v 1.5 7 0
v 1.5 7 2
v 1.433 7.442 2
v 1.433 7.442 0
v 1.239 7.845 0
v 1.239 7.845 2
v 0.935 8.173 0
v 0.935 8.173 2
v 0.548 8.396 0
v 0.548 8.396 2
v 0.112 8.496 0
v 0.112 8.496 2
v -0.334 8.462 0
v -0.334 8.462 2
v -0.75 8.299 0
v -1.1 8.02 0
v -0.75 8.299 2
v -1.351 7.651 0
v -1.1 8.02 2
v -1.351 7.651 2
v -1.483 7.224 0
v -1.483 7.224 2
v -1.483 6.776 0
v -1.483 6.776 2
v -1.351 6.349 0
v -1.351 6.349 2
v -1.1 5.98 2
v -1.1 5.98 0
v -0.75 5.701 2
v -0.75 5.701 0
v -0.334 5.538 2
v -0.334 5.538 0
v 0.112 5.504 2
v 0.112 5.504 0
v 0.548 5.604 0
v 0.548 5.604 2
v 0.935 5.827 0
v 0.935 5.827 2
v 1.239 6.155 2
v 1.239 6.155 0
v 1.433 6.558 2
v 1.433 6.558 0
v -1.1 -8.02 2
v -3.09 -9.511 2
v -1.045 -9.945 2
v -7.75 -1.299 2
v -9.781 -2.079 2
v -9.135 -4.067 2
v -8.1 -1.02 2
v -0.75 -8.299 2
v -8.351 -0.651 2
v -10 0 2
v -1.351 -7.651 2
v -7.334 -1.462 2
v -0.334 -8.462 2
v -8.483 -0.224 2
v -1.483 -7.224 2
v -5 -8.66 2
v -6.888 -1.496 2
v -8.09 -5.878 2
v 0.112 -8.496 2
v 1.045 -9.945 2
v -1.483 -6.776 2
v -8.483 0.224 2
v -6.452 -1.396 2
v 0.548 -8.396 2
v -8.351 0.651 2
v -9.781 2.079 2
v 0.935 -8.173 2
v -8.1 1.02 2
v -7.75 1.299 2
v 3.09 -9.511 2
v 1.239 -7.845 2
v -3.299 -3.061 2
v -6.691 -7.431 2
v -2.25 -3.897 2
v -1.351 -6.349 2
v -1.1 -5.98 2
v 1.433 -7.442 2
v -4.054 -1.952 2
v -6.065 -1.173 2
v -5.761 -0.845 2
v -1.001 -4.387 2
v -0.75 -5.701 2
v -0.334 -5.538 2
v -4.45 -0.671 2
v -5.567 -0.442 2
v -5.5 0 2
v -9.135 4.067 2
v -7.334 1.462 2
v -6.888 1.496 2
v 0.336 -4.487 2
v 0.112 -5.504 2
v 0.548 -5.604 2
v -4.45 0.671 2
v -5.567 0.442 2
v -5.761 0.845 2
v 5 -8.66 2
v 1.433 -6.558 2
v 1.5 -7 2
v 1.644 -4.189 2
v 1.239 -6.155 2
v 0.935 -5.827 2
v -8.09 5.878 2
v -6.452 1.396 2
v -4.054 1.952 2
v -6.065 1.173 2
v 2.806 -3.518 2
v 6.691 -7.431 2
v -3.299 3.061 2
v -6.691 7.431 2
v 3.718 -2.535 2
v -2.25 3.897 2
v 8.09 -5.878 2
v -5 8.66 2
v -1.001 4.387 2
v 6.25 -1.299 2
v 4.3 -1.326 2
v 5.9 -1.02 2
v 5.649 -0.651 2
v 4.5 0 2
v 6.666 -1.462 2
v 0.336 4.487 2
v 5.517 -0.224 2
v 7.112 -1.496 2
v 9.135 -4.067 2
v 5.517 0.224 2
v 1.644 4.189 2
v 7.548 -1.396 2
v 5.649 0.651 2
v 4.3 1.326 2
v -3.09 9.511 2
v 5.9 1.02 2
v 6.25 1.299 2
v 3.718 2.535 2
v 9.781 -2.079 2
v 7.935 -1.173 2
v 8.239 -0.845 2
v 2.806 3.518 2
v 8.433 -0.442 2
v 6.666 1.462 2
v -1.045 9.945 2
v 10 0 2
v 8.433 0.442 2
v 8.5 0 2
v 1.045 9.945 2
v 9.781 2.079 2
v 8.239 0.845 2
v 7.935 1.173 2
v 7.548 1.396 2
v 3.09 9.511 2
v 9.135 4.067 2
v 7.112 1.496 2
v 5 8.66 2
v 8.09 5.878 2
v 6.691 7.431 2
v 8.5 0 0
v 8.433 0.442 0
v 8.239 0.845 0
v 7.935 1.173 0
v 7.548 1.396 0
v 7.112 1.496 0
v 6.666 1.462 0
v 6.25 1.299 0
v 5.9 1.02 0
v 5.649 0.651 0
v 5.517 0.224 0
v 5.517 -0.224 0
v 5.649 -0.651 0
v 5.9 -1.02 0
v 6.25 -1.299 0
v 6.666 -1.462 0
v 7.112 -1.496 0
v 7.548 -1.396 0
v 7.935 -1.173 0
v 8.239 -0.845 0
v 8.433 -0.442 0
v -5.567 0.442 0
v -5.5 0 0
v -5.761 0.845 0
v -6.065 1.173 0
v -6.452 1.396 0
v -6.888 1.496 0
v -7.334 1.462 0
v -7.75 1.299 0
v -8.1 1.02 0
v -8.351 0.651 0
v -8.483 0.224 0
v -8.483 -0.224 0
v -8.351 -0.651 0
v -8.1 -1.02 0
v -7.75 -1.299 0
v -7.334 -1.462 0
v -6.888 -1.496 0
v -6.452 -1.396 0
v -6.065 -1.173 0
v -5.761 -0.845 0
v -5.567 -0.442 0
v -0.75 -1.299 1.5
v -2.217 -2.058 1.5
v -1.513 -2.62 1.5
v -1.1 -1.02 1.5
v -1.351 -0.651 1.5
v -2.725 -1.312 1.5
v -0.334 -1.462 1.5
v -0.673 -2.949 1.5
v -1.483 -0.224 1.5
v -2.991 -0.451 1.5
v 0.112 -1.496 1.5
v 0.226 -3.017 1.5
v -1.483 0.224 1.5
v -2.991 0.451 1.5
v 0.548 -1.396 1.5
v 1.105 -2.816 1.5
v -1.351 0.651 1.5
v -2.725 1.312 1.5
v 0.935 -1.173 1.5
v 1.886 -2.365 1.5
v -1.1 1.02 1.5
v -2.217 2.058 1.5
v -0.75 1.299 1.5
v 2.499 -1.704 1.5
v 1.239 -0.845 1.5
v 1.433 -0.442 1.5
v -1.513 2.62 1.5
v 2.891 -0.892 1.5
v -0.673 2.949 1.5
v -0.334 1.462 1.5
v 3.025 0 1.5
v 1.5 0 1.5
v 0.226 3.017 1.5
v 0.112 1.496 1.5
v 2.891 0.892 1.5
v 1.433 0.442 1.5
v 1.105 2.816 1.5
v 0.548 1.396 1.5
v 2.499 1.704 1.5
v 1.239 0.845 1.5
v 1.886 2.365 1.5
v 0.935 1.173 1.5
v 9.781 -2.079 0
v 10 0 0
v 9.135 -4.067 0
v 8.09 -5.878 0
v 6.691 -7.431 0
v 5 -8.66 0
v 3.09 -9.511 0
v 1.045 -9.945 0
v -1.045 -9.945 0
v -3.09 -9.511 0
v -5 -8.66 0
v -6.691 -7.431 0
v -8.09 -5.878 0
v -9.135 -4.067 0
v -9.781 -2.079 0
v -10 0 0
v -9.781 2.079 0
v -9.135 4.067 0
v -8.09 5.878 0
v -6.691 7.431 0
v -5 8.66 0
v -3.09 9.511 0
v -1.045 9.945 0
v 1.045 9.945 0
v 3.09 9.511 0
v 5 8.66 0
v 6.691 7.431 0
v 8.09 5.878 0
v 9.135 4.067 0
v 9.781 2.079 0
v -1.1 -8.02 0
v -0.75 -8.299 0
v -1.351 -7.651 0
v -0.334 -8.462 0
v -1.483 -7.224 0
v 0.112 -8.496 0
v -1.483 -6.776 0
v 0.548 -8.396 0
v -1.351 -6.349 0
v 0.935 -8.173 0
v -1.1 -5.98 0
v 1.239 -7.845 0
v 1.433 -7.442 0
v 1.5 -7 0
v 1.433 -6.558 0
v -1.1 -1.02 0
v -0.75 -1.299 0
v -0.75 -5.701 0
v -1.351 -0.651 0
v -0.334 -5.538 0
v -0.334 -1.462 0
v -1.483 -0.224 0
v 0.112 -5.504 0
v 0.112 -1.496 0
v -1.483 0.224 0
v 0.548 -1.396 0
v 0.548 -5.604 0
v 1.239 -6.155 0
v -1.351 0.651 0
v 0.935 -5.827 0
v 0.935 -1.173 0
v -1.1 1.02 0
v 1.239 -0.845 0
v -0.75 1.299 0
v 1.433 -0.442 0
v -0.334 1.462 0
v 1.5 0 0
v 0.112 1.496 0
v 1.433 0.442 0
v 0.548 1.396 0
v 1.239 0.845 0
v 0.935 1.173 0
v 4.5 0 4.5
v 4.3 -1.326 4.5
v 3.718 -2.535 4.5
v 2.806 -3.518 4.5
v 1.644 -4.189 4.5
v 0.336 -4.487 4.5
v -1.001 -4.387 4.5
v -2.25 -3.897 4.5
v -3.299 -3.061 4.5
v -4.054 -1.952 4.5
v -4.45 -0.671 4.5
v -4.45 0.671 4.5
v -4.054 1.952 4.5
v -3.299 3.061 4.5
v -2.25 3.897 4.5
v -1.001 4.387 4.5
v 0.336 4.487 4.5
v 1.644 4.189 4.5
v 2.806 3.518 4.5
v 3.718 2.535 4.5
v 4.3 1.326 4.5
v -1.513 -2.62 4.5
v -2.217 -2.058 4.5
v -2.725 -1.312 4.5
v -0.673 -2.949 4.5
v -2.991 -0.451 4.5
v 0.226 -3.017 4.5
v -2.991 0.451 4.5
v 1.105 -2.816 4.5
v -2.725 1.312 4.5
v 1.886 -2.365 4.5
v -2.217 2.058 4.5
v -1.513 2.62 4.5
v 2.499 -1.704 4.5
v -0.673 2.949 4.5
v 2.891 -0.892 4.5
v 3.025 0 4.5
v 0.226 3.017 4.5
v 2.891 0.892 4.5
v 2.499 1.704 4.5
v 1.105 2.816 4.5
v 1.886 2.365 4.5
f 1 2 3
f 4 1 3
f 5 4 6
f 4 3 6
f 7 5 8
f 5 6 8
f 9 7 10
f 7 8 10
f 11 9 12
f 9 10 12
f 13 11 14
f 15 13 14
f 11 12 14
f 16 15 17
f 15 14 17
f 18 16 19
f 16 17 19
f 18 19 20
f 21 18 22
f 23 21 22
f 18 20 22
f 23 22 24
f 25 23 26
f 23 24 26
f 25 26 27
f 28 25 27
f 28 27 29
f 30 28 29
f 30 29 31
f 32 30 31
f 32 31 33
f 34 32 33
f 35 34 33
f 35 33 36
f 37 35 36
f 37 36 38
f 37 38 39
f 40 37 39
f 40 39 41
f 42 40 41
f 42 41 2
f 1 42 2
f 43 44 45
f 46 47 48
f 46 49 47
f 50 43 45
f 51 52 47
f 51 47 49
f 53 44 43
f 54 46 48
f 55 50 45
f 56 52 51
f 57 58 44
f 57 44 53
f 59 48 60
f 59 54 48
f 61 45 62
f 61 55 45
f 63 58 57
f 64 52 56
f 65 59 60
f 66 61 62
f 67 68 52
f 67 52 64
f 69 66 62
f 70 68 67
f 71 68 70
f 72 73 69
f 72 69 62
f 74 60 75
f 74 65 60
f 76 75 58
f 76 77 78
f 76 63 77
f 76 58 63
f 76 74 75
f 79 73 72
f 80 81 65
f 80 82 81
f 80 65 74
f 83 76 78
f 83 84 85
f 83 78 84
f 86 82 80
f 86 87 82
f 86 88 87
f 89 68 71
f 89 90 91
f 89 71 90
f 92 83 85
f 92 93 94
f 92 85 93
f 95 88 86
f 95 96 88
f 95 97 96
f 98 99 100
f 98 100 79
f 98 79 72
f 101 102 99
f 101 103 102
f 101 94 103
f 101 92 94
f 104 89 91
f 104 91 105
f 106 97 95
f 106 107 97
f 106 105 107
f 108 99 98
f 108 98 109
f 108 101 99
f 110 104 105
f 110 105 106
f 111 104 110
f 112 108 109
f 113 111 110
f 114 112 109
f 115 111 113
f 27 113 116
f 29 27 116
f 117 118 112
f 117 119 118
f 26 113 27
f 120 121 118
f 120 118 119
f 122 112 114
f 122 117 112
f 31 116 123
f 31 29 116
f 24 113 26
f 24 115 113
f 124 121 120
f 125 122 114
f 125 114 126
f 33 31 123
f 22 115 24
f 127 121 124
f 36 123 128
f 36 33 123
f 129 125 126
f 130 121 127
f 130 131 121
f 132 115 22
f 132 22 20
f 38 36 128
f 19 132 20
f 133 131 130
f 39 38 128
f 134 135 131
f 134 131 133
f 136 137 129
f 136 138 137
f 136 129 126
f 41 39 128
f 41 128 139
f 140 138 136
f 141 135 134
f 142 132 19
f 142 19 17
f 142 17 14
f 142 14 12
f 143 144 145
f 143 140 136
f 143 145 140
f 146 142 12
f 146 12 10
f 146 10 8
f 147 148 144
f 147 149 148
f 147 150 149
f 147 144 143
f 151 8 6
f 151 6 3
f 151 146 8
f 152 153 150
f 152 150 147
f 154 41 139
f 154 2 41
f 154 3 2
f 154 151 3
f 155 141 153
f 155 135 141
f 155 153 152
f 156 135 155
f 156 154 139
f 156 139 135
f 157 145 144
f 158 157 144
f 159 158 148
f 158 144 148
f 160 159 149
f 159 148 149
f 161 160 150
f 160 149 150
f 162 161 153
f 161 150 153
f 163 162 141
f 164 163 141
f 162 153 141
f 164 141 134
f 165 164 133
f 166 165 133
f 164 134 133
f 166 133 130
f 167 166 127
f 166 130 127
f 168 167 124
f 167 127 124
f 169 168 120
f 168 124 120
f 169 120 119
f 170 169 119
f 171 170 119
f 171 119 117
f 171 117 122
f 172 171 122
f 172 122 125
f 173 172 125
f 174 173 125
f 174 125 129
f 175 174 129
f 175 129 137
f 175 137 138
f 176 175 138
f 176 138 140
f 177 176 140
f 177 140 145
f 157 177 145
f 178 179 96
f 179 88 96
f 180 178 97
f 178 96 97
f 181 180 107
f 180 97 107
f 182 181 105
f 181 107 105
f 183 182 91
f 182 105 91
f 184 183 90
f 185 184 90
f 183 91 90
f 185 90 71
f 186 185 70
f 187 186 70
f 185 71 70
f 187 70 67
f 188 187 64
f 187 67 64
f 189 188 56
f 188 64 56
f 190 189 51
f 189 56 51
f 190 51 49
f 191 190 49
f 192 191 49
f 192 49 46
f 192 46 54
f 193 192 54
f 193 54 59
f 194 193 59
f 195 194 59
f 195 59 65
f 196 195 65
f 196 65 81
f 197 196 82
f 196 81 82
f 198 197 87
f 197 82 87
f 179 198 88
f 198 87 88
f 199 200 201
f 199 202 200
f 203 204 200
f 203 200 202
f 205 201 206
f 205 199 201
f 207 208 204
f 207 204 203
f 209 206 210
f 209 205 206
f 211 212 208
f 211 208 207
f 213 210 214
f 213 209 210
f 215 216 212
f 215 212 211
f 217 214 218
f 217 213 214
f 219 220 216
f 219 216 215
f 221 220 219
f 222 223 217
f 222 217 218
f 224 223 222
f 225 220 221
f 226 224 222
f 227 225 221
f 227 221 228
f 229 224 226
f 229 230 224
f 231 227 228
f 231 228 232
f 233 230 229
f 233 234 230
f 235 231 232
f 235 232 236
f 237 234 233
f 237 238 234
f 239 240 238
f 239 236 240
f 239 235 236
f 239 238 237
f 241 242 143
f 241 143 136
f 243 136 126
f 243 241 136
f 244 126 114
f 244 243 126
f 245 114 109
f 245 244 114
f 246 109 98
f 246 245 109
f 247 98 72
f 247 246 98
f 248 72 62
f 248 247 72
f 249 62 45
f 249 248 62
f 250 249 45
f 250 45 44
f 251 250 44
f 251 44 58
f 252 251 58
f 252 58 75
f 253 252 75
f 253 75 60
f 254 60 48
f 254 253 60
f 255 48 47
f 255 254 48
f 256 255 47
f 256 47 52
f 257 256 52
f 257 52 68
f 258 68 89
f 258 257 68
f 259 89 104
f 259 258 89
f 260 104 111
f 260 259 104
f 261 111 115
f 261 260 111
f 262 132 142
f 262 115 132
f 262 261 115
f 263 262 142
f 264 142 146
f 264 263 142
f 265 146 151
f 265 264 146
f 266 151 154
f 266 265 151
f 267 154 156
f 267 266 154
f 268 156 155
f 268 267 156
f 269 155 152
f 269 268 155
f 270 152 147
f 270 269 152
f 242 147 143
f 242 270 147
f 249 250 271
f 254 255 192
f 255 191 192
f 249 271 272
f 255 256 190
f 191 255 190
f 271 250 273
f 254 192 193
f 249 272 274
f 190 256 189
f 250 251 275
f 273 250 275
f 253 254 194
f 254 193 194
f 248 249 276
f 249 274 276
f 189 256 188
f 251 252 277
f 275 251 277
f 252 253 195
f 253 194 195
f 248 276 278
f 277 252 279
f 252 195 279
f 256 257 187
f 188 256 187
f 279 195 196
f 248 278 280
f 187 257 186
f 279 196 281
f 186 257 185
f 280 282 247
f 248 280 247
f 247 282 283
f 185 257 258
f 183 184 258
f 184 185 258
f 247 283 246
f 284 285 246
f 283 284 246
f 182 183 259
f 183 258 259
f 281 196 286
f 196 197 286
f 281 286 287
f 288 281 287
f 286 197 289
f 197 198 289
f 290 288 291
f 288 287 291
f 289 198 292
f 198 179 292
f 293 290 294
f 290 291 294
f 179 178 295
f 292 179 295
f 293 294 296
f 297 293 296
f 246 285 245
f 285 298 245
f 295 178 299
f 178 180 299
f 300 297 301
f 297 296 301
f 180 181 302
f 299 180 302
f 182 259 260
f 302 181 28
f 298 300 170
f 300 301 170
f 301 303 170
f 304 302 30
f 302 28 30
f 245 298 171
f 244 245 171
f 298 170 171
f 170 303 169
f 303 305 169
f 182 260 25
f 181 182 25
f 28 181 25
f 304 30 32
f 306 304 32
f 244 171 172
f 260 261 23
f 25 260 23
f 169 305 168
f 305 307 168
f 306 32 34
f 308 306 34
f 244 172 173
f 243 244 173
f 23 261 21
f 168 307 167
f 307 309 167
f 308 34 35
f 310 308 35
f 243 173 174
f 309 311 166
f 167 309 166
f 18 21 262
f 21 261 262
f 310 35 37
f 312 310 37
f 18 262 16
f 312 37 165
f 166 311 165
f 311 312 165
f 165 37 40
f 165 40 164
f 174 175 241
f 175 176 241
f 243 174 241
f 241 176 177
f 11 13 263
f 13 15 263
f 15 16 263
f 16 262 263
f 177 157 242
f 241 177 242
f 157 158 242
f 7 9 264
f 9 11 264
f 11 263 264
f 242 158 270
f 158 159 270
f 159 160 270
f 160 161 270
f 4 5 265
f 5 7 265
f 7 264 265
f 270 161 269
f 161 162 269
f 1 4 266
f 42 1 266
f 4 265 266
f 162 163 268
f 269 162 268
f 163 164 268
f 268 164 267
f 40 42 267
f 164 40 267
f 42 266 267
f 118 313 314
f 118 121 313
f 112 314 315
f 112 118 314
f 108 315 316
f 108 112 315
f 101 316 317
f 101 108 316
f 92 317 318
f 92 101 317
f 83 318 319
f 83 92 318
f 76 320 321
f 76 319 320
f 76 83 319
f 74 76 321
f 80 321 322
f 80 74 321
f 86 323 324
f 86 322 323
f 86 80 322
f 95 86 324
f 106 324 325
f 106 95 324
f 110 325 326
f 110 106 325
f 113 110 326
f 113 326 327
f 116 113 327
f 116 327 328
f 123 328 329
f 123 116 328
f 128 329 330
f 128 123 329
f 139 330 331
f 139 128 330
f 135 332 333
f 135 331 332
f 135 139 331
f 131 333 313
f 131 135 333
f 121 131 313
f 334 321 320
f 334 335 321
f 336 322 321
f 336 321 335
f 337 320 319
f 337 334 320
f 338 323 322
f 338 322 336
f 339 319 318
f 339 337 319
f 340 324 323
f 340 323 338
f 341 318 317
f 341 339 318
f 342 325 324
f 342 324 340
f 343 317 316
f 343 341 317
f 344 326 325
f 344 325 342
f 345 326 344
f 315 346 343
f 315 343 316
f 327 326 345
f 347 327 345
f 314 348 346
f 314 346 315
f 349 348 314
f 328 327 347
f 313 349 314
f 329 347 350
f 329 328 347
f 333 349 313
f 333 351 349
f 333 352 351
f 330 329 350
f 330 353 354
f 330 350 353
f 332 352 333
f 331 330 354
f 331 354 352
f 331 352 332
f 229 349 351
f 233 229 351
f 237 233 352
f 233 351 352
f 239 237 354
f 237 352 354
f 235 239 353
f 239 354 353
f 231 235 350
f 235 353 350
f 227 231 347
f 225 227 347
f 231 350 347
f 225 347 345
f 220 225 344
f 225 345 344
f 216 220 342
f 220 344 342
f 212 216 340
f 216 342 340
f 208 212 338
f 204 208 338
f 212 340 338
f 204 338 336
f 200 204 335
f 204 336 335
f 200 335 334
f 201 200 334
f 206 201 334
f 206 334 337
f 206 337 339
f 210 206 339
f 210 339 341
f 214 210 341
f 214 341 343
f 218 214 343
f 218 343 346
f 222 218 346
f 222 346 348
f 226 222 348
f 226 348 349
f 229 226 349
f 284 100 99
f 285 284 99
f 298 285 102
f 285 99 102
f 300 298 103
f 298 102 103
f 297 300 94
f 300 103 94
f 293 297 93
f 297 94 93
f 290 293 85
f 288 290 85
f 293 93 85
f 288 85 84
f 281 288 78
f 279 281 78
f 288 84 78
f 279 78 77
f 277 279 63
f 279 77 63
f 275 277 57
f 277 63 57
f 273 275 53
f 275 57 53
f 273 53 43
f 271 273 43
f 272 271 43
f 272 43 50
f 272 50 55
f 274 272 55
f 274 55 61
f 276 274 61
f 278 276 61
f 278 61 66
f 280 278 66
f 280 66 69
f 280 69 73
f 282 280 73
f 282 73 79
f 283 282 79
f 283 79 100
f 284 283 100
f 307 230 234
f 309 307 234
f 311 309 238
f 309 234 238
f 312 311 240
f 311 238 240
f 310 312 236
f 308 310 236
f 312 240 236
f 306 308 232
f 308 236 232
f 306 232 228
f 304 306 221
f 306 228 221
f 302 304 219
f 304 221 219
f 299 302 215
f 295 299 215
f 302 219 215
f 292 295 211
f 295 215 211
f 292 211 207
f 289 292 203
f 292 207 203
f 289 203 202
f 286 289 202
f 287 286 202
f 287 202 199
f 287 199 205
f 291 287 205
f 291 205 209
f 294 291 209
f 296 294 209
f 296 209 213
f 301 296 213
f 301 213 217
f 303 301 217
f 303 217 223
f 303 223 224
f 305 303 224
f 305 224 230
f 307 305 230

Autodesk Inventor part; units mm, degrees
ref_plane "YZ Plane" through (0, 0, 0) normal (1, 0, 0) x (0, 1, 0)
ref_plane "XZ Plane" through (0, 0, 0) normal (0, 1, 0) x (-1, 0, 0)
ref_plane "XY Plane" through (0, 0, 0) normal (0, 0, 1) x (1, 0, 0)
sketch "Sketch1" plane through (0, 0, 0) normal (0, 0, 1) x (1, 0, 0)
  circle A0 centre (0, 0) radius 10
  dimension "d0" = 20
extrude "Extrusion1" add sketch "Sketch1" along normal blind 2
sketch "Sketch2" plane through (0, 0, 2) normal (0, 0, 1) x (1, 0, 0)
  circle A0 centre (0, 0) radius 4.5
  dimension "d3" = 9
extrude "Extrusion2" add sketch "Sketch2" along normal blind 2.5
sketch "Sketch3" plane through (0, 0, 4.5) normal (0, 0, 1) x (1, 0, 0)
  circle A0 centre (0, 0) radius 1.5
  dimension "d6" = 3
extrude "Extrusion3" cut sketch "Sketch3" against normal through all
sketch "Sketch4" plane through (0, 0, 4.5) normal (0, 0, 1) x (1, 0, 0)
  circle A0 centre (0, 0) radius 3.025
  dimension "d9" = 6.05
extrude "Extrusion4" cut sketch "Sketch4" against normal blind 2.5
sketch "Sketch5" plane through (0, 0, 2) normal (0, 0, 1) x (1, 0, 0)
  line L0 (0, 0) -> (0, 7)
  circle A0 centre (0, 7) radius 1.5
  circle A1 centre (-7, 0) radius 1.5
  circle A2 centre (0, -7) radius 1.5
  circle A3 centre (7, 0) radius 1.5
  dimension "d12" = 7
  dimension "d13" = 3
  dimension "d16" = 360
extrude "Extrusion5" cut sketch "Sketch5" against normal through all
thread "Thread1" size "M3x0.5" class "6H" standard "ANSI Metric M Profile" full length
thread "Thread2" size "M3x0.5" class "6H" standard "ANSI Metric M Profile" full length
thread "Thread3" size "M3x0.5" class "6H" standard "ANSI Metric M Profile" full length
thread "Thread4" size "M3x0.5" class "6H" standard "ANSI Metric M Profile" full length
sketch "Sketch6" plane through (0, 0, 2) normal (0, 0, 1) x (1, 0, 0)
  circle A0 centre (0, 0) radius 3.025
extrude "Extrusion6" cut sketch "Sketch6" against normal blind 0.5
properties part number "servo_FT_SC_horn_1"
